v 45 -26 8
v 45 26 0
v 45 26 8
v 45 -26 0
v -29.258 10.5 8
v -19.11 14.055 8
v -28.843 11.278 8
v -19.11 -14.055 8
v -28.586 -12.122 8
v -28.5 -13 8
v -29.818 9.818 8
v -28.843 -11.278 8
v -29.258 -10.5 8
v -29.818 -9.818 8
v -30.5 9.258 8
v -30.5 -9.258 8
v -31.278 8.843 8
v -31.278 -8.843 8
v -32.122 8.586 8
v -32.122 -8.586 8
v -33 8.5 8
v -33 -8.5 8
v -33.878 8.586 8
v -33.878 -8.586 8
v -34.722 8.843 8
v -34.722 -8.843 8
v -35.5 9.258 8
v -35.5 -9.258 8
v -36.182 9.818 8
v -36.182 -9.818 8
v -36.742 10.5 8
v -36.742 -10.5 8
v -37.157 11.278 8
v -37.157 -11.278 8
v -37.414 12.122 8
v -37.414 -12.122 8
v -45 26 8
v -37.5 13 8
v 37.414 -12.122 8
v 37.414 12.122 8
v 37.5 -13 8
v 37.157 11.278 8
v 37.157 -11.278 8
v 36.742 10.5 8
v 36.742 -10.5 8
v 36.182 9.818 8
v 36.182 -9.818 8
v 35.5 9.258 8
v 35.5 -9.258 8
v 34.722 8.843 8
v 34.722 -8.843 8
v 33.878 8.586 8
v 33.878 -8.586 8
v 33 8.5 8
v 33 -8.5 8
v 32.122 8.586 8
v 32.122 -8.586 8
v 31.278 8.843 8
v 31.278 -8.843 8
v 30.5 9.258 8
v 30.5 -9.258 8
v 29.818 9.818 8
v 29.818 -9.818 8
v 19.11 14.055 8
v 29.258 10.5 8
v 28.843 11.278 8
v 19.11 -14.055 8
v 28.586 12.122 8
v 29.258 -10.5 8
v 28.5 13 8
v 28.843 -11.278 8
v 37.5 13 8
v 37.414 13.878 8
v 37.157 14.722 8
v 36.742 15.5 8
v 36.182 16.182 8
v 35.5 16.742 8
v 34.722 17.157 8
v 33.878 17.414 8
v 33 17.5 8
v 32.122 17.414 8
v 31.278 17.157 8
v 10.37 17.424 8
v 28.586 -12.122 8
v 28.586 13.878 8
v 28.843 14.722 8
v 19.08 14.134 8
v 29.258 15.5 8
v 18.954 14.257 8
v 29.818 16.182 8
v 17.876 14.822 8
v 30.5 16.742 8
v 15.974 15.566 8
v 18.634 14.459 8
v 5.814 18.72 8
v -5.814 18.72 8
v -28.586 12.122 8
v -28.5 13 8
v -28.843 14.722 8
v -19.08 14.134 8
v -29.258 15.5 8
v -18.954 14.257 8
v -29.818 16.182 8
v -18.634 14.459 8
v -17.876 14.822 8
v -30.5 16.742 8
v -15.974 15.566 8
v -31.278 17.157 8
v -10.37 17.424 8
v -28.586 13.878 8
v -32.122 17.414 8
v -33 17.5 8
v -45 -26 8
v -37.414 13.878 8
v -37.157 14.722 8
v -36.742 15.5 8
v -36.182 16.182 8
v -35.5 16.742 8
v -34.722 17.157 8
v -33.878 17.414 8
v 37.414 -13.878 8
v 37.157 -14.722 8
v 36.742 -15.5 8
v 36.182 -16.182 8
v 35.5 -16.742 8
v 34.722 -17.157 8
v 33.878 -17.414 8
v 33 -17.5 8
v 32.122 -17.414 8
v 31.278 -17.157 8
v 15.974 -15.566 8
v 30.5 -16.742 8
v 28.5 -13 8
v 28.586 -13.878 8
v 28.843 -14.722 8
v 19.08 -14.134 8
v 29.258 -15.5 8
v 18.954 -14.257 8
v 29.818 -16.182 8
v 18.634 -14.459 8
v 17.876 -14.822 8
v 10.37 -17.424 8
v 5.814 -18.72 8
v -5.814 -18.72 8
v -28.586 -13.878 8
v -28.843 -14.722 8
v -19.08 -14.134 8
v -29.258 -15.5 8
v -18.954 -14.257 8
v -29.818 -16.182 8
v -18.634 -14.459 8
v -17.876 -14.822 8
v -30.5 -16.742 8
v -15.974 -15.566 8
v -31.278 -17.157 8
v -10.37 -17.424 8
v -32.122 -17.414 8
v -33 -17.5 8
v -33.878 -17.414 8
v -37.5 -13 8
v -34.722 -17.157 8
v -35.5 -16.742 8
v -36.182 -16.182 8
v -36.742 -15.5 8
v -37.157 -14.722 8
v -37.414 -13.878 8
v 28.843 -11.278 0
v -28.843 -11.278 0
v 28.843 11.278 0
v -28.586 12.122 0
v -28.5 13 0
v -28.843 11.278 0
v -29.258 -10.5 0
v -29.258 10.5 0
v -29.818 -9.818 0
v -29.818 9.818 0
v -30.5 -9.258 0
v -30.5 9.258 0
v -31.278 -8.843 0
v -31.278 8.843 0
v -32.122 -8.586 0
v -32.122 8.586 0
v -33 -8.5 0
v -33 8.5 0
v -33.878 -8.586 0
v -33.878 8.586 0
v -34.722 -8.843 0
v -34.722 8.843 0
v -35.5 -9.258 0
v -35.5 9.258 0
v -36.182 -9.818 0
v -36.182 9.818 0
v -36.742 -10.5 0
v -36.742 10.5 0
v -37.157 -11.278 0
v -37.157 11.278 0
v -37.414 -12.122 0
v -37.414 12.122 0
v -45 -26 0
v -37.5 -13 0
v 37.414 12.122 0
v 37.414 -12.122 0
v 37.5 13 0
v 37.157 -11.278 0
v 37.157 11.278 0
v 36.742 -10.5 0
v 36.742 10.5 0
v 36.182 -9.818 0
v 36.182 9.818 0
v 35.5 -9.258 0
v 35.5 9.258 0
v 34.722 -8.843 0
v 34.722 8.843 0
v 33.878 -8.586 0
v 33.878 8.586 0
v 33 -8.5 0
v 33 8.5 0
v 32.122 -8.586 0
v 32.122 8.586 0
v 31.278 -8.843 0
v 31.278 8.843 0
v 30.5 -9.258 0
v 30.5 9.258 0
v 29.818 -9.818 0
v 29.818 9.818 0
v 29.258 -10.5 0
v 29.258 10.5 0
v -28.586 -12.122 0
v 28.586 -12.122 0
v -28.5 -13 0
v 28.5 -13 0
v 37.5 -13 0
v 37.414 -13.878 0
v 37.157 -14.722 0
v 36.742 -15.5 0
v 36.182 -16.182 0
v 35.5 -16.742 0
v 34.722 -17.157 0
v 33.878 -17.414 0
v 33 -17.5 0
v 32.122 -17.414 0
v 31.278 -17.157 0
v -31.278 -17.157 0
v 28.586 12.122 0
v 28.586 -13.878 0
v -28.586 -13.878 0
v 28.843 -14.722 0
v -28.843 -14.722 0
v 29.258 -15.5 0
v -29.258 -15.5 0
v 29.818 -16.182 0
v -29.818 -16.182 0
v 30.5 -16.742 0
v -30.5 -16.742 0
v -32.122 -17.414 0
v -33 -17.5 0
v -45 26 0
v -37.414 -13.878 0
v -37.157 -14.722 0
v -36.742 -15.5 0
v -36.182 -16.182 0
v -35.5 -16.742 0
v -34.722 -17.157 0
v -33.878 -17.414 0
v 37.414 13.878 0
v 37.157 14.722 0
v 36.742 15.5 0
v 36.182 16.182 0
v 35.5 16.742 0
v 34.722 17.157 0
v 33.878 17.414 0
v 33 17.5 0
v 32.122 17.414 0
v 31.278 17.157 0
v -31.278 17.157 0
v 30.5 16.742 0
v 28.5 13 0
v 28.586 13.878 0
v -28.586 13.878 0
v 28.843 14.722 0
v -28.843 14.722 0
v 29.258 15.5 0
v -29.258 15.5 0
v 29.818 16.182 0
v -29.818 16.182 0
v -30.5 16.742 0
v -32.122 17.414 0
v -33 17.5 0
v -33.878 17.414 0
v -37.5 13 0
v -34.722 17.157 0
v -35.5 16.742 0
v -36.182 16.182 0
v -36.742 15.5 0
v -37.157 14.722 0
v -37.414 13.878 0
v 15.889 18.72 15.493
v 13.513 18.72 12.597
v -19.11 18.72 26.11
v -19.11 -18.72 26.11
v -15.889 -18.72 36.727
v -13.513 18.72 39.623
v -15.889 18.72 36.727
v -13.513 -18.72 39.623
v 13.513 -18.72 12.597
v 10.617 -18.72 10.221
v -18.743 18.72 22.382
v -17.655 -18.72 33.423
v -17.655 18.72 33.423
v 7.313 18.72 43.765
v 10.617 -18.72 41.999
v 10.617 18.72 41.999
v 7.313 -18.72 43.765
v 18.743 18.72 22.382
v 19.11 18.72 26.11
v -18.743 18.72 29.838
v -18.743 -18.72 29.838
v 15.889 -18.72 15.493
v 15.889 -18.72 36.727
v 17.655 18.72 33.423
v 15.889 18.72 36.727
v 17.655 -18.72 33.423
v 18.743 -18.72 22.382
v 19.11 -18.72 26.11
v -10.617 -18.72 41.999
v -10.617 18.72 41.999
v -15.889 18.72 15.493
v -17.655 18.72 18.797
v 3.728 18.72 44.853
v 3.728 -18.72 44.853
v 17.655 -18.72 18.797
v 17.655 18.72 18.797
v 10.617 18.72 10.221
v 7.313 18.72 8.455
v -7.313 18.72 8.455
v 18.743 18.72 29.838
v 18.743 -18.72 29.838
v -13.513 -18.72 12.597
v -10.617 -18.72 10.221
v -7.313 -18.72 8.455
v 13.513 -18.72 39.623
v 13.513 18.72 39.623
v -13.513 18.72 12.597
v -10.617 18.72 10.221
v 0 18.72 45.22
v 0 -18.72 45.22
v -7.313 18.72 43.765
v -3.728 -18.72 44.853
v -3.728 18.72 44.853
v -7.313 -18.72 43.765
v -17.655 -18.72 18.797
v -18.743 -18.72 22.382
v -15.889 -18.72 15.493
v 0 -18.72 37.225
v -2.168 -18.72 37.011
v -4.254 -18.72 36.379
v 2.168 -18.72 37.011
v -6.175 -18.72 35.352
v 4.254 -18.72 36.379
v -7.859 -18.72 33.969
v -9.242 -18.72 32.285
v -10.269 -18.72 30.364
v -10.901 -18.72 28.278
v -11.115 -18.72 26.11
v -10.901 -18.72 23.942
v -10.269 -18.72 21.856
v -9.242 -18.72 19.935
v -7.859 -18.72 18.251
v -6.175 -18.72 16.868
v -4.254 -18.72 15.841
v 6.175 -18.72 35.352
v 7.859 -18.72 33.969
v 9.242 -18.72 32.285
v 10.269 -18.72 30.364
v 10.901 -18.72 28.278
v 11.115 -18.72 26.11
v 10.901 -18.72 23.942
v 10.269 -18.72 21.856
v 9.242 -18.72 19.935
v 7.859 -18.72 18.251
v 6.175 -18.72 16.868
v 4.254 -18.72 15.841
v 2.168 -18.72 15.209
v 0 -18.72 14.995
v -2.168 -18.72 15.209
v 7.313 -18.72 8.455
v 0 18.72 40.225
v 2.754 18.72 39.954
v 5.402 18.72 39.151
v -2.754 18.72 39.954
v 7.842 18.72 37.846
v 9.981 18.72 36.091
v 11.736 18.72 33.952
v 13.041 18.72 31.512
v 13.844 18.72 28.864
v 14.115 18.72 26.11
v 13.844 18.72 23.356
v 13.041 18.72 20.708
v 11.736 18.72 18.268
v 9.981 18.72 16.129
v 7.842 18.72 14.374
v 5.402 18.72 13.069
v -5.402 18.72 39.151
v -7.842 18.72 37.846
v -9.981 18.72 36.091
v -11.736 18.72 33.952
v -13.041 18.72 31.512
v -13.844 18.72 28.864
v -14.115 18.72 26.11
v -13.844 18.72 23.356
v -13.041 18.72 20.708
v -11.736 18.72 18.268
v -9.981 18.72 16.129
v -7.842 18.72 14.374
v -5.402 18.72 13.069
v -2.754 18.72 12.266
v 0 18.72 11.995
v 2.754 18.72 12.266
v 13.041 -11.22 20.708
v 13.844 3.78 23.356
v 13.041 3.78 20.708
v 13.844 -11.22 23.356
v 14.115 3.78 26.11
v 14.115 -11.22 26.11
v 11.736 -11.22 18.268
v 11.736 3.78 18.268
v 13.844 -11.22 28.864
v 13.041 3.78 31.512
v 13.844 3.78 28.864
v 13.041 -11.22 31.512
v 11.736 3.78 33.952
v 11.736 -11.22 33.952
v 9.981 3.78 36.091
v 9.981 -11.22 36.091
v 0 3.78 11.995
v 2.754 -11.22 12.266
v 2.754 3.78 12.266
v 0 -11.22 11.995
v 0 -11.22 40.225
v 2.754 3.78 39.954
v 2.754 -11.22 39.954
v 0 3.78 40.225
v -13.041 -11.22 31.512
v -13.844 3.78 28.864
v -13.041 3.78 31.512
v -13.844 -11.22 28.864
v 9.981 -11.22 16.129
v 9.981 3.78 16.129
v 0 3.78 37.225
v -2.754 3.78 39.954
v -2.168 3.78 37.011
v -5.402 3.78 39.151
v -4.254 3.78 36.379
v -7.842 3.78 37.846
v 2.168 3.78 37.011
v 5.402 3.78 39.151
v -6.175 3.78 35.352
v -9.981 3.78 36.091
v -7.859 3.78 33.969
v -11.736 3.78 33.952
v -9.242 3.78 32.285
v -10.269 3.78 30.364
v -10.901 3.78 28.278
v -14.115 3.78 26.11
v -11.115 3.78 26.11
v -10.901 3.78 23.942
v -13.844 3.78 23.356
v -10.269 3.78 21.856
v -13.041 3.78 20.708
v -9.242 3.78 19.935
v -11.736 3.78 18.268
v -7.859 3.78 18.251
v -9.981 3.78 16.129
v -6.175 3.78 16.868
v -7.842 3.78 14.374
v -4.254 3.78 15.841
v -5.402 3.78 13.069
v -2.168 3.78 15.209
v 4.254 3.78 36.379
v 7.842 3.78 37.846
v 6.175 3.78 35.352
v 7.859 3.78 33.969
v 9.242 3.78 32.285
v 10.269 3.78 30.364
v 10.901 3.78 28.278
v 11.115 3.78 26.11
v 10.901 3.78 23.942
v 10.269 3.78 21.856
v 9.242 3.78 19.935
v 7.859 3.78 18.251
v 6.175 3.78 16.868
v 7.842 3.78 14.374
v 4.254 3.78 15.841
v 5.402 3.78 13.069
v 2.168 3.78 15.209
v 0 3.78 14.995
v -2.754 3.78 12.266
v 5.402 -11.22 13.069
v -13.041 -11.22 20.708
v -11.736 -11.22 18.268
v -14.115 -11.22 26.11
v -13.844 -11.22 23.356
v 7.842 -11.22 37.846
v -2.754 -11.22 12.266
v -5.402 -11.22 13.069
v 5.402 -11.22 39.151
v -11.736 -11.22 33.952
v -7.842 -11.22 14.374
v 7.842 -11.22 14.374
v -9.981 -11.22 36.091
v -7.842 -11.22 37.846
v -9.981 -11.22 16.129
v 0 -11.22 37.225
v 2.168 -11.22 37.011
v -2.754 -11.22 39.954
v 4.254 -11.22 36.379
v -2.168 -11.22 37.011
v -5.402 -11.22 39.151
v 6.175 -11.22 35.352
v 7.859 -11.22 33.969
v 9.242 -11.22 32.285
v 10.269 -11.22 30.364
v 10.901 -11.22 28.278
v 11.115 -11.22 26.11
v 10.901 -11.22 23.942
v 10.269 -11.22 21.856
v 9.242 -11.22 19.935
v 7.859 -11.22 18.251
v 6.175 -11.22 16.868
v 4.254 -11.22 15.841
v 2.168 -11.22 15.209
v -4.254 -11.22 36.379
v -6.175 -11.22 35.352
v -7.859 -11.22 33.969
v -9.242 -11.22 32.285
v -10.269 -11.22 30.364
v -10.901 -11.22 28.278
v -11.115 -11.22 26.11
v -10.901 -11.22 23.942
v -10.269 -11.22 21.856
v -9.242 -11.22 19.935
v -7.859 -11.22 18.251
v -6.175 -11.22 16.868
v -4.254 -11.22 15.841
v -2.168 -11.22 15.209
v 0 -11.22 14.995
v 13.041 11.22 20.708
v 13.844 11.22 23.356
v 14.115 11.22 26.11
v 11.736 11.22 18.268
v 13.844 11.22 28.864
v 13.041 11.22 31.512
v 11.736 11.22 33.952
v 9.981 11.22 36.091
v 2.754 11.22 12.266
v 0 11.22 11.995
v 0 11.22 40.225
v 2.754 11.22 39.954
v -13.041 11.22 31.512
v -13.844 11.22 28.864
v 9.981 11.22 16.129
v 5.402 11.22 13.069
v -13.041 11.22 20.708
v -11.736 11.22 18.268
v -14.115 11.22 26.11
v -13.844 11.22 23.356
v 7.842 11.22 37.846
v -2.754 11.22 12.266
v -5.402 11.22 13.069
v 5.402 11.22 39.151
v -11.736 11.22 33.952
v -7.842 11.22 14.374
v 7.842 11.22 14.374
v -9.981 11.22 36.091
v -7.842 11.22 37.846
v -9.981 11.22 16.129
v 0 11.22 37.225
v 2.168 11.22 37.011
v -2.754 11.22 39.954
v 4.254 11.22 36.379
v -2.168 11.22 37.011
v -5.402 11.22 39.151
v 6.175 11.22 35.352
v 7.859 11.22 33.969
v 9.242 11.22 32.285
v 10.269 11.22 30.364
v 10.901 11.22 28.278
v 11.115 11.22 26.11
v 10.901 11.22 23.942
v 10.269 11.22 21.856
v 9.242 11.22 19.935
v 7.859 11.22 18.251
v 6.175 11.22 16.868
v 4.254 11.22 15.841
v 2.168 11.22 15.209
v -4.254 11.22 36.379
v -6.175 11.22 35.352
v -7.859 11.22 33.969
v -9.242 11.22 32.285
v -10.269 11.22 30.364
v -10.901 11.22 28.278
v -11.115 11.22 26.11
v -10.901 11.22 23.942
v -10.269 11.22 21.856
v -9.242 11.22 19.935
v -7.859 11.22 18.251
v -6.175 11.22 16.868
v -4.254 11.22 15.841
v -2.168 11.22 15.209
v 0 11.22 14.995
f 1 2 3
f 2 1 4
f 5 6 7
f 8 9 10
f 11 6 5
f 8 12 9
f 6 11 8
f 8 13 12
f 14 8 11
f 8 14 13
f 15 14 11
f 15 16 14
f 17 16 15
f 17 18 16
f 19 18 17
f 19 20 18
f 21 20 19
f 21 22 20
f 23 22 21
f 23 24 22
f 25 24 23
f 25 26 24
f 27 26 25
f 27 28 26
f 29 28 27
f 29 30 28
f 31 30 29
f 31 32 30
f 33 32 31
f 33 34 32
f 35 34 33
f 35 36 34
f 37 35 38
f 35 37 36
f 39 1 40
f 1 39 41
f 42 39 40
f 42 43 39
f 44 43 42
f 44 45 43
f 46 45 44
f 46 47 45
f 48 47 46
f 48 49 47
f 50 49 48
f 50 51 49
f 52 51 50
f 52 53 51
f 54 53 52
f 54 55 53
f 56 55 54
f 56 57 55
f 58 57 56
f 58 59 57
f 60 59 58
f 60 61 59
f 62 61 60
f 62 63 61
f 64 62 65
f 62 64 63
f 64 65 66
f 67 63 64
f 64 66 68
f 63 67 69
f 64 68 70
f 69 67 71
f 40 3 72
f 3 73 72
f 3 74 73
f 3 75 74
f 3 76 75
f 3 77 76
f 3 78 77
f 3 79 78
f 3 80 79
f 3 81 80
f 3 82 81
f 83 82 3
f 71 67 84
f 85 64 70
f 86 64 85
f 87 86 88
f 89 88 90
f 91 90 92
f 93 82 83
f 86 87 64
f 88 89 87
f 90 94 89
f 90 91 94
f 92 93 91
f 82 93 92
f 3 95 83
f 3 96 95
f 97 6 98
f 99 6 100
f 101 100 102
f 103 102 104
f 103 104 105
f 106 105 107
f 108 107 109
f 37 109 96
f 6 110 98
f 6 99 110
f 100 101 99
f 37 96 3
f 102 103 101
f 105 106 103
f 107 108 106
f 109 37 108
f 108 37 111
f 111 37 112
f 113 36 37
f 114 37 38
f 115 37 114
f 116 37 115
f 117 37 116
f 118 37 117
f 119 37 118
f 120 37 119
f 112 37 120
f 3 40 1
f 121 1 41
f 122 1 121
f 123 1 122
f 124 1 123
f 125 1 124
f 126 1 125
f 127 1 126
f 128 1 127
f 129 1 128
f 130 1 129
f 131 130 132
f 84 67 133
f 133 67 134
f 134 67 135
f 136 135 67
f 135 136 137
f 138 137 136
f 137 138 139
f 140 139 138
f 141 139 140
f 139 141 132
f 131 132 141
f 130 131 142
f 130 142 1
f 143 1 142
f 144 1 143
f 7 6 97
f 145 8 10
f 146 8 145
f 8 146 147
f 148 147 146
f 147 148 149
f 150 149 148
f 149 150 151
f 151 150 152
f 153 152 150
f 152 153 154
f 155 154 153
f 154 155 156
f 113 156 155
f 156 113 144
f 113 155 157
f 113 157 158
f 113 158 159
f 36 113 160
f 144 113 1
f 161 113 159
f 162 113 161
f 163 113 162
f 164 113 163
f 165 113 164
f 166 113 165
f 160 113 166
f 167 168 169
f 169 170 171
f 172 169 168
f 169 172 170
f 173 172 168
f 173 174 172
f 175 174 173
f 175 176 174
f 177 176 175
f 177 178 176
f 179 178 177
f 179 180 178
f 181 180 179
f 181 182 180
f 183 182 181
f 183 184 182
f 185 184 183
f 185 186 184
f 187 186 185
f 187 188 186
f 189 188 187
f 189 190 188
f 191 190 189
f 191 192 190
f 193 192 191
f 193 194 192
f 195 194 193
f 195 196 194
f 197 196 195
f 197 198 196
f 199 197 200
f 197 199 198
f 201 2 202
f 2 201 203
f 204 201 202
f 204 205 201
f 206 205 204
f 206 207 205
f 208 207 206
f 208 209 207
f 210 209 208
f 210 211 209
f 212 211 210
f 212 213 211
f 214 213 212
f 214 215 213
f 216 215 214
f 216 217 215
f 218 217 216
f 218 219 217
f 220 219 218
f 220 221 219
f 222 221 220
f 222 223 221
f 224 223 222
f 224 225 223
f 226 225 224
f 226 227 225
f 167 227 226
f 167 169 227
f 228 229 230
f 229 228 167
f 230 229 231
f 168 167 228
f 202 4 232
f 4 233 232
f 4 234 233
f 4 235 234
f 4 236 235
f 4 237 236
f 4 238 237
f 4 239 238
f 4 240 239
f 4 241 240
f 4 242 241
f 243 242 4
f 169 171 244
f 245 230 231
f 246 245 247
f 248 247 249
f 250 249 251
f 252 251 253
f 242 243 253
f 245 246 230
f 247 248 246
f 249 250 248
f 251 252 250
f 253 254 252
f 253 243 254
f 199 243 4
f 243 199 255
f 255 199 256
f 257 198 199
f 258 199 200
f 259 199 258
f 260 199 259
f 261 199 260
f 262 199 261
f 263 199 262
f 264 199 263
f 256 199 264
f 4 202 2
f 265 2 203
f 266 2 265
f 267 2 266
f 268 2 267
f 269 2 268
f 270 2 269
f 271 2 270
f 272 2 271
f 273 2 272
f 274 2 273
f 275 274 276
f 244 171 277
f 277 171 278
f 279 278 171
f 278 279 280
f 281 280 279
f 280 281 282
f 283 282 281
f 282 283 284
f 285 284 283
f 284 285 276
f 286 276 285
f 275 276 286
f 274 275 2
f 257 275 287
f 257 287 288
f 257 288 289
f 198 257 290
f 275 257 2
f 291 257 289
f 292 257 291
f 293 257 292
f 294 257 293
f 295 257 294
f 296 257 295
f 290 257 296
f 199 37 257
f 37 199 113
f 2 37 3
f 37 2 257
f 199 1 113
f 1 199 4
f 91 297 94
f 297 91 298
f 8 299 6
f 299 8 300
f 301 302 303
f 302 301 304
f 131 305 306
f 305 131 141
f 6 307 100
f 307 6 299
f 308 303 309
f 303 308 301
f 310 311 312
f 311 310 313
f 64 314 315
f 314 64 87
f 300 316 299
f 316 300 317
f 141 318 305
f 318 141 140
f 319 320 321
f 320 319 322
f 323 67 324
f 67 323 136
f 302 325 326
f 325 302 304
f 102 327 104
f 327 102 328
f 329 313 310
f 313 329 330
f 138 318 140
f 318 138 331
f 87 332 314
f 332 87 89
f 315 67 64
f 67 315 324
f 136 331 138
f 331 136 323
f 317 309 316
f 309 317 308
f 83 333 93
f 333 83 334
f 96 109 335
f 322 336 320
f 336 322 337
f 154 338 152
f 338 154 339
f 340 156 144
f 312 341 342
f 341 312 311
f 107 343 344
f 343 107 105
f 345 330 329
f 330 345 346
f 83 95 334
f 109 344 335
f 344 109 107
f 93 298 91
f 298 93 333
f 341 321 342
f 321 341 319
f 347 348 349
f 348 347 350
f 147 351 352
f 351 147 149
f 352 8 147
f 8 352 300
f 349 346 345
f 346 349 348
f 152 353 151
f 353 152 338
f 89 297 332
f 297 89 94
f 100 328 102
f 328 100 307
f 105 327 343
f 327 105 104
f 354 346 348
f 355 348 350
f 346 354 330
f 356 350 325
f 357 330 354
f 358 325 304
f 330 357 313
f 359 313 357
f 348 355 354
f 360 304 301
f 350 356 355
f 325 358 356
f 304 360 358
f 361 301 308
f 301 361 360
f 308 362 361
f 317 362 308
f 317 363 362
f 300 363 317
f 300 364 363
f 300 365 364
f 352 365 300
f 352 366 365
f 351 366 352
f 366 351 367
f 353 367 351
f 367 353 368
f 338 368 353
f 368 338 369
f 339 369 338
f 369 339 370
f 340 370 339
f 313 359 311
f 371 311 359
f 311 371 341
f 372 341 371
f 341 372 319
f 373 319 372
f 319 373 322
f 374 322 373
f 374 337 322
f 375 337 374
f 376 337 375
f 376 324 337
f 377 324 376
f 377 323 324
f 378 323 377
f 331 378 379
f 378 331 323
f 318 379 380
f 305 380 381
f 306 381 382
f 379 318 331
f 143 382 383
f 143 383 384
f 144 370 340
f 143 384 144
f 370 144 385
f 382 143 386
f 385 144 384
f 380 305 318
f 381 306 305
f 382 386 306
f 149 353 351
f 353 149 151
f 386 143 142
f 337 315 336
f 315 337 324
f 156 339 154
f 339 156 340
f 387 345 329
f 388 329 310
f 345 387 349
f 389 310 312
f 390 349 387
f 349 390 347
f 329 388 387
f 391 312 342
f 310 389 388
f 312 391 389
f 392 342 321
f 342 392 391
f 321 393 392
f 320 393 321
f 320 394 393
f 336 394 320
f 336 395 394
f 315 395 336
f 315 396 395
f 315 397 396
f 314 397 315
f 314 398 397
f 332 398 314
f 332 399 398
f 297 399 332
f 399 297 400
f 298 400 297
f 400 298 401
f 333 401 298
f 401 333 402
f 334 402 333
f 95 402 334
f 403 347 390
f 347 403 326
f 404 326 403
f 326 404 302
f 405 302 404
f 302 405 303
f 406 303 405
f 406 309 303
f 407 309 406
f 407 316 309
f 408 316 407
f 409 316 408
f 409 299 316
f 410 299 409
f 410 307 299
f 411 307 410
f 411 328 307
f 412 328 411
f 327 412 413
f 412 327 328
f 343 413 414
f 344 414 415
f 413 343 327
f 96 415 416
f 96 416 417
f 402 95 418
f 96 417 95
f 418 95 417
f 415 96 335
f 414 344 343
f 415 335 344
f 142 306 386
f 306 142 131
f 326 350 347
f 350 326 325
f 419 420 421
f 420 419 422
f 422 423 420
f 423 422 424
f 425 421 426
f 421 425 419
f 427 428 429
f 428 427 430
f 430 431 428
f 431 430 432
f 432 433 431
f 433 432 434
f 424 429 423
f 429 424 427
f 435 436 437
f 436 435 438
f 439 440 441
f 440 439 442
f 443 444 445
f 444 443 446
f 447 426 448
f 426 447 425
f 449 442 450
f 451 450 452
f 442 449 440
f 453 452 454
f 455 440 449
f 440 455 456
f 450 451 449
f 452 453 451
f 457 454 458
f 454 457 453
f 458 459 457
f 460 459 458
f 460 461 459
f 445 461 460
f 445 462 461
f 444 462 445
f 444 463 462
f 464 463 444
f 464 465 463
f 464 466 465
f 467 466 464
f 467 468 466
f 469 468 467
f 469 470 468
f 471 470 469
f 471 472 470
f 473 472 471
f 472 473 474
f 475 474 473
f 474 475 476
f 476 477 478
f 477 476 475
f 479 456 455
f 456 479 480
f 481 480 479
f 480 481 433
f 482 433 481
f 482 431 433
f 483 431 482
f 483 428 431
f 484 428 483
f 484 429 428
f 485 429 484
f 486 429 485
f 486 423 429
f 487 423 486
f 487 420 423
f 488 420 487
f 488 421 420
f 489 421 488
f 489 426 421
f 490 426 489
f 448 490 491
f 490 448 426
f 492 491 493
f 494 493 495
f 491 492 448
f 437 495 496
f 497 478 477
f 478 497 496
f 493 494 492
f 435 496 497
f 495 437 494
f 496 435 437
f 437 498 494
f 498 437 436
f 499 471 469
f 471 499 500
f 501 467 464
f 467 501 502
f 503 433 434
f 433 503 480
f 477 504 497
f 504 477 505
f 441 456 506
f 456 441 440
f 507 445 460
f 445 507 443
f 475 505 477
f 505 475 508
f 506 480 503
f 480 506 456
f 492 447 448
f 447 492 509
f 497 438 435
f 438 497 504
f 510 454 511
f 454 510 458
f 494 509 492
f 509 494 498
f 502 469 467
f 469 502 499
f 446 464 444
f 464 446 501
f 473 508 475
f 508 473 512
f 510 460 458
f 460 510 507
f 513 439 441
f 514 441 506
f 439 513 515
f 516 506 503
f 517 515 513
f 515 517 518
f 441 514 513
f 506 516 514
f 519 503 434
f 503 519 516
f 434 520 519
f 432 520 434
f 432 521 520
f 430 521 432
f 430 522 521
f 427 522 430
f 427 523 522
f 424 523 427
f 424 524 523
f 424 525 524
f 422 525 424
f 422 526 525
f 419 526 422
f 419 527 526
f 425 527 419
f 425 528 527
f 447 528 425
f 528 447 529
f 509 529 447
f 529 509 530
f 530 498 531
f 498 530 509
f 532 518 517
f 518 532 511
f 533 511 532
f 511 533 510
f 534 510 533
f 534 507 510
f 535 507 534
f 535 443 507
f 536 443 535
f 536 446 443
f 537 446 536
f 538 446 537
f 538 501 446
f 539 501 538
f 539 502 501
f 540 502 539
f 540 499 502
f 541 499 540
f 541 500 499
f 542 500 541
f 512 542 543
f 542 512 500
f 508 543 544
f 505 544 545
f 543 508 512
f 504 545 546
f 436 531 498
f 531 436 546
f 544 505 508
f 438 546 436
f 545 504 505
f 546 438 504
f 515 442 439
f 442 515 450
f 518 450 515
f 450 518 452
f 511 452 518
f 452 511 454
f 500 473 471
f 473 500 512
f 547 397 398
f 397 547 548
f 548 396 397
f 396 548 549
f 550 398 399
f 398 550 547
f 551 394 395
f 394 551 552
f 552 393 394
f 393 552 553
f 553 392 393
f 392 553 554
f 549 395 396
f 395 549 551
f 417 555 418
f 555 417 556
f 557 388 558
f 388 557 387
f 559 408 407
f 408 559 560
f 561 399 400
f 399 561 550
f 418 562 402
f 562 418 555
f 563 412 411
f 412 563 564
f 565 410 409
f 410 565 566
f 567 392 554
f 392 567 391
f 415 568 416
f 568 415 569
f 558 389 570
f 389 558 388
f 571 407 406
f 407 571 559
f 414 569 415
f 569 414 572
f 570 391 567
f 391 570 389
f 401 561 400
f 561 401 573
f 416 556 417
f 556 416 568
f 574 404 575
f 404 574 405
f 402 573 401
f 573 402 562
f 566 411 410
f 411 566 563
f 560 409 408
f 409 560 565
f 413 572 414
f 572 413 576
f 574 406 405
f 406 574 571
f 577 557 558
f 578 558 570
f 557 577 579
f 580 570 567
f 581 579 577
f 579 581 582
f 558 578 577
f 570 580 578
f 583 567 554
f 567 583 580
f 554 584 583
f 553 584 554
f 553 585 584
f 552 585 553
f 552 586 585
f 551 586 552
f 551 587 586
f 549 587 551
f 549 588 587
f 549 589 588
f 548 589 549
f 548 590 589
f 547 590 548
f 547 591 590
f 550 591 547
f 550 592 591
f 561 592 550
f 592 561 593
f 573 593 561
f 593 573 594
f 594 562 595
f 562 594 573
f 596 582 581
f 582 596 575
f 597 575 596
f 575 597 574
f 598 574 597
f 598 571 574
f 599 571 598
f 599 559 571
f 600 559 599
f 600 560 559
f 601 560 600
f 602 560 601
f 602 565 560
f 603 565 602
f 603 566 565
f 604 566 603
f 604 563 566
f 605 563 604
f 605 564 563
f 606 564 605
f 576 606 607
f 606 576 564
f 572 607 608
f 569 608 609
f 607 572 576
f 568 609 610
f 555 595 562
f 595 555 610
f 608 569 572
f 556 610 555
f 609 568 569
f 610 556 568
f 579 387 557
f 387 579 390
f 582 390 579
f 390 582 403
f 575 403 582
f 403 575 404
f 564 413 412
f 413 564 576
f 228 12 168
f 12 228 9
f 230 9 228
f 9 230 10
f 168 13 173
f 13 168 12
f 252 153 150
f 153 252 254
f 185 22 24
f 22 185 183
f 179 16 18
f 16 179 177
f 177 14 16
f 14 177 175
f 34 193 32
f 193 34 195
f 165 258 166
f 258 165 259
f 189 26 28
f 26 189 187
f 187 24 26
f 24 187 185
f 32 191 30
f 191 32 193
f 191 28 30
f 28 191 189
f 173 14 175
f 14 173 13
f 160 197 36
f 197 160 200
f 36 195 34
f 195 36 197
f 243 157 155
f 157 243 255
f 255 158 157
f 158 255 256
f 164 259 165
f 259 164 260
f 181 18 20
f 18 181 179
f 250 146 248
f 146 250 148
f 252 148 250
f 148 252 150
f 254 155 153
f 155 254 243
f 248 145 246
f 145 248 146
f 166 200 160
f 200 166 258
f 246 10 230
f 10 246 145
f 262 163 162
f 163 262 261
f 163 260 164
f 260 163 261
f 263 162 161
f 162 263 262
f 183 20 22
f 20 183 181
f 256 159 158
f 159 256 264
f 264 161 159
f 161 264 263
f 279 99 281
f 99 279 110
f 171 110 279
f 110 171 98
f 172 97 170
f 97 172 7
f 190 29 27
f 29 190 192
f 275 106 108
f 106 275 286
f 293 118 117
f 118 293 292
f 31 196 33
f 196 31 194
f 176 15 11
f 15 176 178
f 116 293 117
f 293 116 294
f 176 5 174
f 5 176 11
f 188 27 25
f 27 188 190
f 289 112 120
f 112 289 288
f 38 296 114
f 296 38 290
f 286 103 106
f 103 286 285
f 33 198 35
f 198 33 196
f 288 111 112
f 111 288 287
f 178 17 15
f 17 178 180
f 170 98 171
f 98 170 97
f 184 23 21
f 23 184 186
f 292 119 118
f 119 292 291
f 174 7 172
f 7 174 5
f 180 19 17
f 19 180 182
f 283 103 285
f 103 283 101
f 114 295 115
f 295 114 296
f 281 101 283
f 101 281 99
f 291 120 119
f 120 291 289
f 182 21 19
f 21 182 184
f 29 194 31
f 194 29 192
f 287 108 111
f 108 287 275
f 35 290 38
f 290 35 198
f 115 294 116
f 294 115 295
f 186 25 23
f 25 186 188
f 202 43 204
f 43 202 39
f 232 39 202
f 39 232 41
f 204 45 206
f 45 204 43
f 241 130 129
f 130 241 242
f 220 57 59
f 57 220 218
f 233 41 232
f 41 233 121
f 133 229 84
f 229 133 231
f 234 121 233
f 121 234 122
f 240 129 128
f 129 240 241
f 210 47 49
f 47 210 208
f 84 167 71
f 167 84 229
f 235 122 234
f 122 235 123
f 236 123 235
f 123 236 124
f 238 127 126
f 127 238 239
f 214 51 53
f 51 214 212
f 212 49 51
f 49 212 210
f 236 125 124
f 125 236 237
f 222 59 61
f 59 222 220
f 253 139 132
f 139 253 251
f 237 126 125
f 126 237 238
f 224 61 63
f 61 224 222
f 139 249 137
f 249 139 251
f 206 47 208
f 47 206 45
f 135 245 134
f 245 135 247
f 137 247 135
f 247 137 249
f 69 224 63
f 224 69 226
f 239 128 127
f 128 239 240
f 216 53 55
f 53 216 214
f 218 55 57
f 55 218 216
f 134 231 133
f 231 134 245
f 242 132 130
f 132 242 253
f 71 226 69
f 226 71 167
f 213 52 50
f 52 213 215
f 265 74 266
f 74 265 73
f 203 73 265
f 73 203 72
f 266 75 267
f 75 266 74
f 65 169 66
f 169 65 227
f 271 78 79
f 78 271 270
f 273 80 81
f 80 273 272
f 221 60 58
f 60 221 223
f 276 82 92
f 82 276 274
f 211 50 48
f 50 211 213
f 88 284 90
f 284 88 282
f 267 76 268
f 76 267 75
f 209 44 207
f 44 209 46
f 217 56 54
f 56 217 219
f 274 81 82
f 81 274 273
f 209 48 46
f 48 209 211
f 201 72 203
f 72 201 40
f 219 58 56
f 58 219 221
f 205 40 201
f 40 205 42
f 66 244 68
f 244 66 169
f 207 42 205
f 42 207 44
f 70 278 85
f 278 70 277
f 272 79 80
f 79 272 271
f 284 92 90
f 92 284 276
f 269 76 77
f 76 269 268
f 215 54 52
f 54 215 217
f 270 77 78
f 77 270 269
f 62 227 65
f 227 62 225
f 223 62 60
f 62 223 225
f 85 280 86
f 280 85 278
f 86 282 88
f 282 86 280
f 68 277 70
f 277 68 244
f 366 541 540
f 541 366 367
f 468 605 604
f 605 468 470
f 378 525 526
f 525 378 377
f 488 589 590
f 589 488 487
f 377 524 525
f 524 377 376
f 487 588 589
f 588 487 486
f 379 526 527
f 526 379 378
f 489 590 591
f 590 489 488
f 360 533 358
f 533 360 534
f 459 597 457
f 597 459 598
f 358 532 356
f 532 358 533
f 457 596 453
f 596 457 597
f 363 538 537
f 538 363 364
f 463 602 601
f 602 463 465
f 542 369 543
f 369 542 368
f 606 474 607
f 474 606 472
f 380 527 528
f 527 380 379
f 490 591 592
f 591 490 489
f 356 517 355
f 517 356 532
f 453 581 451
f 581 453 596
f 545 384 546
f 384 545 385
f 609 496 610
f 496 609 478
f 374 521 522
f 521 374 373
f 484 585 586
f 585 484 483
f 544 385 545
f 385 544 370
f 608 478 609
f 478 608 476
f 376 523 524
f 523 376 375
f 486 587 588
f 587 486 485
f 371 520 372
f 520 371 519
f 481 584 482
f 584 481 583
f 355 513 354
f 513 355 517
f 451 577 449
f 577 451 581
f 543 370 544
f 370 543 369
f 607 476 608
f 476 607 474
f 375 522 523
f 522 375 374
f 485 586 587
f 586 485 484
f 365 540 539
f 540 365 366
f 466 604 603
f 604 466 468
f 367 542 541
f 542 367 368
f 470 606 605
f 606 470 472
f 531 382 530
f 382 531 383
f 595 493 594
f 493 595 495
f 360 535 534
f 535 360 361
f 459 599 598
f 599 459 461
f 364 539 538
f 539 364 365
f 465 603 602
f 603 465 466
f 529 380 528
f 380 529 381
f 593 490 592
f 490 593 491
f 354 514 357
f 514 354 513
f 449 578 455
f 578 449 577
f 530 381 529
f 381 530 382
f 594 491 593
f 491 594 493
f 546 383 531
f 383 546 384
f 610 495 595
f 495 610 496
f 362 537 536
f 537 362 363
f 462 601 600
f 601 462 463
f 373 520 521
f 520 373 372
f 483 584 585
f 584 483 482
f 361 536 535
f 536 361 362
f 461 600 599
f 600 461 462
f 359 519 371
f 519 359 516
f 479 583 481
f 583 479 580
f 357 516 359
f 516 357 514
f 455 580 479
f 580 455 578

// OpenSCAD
$fn = 32;

// ----------------------------------------------------------------------
// Bearing block: 90 x 52 mm base, 22.23 mm bore at 26.11 mm
// ----------------------------------------------------------------------

// --- parameters (mm) ---
base_w = 90;              // base width
base_d = 52;              // base depth
base_t = 8;               // base thickness
bore_d = 22.23;           // shaft / bearing bore
house_r = 19.11;          // housing outer radius
house_len = 37.44;        // housing length along the shaft
foot_w = 38.22;           // foot width under the housing
foot_len = 27.44;         // foot length along the shaft
axis_z = 26.11;           // bore axis height above the base
holes_d = 9;              // mounting holes
hole_x = 33;              // mounting hole spacing
seat_d = 10;              // bearing seat depth
seat_wall = 3;            // seat wall thickness

difference() {
  union() {
    /* base plate with its underside on z = 0 */
    translate([0, 0, base_t / 2]) cube([base_w, base_d, base_t], center = true);
    /* hull foot: a straight web blending into the round housing */
    hull() {
      translate([0, 0, base_t - 0.5]) cube([foot_w, foot_len, 1.6], center = true);
      translate([0, 0, axis_z]) rotate([-90, 0, 0]) cylinder(h = house_len, d = 2 * house_r, center = true);
    }
  }
  /* bore through the housing, 2.5 mm clear on both sides */
  translate([0, 0, axis_z]) rotate([-90, 0, 0]) cylinder(h = house_len + 5, d = bore_d, center = true);
  /* bearing seats, recessed into both ends of the housing */
  for (sy = [-1, 1]) {
    translate([0, sy * (house_len / 2 - seat_d + 2.5), axis_z]) rotate([-90, 0, 0]) cylinder(h = seat_d + 5, d = bore_d + 2 * seat_wall);
  }
  /* mounting holes through the base plate */
  for (hx = [-33, 33]) {
    for (hy = [-13, 13]) {
      translate([hx, hy, -2.5]) cylinder(h = base_t + 5, d = holes_d);
    }
  }
}
